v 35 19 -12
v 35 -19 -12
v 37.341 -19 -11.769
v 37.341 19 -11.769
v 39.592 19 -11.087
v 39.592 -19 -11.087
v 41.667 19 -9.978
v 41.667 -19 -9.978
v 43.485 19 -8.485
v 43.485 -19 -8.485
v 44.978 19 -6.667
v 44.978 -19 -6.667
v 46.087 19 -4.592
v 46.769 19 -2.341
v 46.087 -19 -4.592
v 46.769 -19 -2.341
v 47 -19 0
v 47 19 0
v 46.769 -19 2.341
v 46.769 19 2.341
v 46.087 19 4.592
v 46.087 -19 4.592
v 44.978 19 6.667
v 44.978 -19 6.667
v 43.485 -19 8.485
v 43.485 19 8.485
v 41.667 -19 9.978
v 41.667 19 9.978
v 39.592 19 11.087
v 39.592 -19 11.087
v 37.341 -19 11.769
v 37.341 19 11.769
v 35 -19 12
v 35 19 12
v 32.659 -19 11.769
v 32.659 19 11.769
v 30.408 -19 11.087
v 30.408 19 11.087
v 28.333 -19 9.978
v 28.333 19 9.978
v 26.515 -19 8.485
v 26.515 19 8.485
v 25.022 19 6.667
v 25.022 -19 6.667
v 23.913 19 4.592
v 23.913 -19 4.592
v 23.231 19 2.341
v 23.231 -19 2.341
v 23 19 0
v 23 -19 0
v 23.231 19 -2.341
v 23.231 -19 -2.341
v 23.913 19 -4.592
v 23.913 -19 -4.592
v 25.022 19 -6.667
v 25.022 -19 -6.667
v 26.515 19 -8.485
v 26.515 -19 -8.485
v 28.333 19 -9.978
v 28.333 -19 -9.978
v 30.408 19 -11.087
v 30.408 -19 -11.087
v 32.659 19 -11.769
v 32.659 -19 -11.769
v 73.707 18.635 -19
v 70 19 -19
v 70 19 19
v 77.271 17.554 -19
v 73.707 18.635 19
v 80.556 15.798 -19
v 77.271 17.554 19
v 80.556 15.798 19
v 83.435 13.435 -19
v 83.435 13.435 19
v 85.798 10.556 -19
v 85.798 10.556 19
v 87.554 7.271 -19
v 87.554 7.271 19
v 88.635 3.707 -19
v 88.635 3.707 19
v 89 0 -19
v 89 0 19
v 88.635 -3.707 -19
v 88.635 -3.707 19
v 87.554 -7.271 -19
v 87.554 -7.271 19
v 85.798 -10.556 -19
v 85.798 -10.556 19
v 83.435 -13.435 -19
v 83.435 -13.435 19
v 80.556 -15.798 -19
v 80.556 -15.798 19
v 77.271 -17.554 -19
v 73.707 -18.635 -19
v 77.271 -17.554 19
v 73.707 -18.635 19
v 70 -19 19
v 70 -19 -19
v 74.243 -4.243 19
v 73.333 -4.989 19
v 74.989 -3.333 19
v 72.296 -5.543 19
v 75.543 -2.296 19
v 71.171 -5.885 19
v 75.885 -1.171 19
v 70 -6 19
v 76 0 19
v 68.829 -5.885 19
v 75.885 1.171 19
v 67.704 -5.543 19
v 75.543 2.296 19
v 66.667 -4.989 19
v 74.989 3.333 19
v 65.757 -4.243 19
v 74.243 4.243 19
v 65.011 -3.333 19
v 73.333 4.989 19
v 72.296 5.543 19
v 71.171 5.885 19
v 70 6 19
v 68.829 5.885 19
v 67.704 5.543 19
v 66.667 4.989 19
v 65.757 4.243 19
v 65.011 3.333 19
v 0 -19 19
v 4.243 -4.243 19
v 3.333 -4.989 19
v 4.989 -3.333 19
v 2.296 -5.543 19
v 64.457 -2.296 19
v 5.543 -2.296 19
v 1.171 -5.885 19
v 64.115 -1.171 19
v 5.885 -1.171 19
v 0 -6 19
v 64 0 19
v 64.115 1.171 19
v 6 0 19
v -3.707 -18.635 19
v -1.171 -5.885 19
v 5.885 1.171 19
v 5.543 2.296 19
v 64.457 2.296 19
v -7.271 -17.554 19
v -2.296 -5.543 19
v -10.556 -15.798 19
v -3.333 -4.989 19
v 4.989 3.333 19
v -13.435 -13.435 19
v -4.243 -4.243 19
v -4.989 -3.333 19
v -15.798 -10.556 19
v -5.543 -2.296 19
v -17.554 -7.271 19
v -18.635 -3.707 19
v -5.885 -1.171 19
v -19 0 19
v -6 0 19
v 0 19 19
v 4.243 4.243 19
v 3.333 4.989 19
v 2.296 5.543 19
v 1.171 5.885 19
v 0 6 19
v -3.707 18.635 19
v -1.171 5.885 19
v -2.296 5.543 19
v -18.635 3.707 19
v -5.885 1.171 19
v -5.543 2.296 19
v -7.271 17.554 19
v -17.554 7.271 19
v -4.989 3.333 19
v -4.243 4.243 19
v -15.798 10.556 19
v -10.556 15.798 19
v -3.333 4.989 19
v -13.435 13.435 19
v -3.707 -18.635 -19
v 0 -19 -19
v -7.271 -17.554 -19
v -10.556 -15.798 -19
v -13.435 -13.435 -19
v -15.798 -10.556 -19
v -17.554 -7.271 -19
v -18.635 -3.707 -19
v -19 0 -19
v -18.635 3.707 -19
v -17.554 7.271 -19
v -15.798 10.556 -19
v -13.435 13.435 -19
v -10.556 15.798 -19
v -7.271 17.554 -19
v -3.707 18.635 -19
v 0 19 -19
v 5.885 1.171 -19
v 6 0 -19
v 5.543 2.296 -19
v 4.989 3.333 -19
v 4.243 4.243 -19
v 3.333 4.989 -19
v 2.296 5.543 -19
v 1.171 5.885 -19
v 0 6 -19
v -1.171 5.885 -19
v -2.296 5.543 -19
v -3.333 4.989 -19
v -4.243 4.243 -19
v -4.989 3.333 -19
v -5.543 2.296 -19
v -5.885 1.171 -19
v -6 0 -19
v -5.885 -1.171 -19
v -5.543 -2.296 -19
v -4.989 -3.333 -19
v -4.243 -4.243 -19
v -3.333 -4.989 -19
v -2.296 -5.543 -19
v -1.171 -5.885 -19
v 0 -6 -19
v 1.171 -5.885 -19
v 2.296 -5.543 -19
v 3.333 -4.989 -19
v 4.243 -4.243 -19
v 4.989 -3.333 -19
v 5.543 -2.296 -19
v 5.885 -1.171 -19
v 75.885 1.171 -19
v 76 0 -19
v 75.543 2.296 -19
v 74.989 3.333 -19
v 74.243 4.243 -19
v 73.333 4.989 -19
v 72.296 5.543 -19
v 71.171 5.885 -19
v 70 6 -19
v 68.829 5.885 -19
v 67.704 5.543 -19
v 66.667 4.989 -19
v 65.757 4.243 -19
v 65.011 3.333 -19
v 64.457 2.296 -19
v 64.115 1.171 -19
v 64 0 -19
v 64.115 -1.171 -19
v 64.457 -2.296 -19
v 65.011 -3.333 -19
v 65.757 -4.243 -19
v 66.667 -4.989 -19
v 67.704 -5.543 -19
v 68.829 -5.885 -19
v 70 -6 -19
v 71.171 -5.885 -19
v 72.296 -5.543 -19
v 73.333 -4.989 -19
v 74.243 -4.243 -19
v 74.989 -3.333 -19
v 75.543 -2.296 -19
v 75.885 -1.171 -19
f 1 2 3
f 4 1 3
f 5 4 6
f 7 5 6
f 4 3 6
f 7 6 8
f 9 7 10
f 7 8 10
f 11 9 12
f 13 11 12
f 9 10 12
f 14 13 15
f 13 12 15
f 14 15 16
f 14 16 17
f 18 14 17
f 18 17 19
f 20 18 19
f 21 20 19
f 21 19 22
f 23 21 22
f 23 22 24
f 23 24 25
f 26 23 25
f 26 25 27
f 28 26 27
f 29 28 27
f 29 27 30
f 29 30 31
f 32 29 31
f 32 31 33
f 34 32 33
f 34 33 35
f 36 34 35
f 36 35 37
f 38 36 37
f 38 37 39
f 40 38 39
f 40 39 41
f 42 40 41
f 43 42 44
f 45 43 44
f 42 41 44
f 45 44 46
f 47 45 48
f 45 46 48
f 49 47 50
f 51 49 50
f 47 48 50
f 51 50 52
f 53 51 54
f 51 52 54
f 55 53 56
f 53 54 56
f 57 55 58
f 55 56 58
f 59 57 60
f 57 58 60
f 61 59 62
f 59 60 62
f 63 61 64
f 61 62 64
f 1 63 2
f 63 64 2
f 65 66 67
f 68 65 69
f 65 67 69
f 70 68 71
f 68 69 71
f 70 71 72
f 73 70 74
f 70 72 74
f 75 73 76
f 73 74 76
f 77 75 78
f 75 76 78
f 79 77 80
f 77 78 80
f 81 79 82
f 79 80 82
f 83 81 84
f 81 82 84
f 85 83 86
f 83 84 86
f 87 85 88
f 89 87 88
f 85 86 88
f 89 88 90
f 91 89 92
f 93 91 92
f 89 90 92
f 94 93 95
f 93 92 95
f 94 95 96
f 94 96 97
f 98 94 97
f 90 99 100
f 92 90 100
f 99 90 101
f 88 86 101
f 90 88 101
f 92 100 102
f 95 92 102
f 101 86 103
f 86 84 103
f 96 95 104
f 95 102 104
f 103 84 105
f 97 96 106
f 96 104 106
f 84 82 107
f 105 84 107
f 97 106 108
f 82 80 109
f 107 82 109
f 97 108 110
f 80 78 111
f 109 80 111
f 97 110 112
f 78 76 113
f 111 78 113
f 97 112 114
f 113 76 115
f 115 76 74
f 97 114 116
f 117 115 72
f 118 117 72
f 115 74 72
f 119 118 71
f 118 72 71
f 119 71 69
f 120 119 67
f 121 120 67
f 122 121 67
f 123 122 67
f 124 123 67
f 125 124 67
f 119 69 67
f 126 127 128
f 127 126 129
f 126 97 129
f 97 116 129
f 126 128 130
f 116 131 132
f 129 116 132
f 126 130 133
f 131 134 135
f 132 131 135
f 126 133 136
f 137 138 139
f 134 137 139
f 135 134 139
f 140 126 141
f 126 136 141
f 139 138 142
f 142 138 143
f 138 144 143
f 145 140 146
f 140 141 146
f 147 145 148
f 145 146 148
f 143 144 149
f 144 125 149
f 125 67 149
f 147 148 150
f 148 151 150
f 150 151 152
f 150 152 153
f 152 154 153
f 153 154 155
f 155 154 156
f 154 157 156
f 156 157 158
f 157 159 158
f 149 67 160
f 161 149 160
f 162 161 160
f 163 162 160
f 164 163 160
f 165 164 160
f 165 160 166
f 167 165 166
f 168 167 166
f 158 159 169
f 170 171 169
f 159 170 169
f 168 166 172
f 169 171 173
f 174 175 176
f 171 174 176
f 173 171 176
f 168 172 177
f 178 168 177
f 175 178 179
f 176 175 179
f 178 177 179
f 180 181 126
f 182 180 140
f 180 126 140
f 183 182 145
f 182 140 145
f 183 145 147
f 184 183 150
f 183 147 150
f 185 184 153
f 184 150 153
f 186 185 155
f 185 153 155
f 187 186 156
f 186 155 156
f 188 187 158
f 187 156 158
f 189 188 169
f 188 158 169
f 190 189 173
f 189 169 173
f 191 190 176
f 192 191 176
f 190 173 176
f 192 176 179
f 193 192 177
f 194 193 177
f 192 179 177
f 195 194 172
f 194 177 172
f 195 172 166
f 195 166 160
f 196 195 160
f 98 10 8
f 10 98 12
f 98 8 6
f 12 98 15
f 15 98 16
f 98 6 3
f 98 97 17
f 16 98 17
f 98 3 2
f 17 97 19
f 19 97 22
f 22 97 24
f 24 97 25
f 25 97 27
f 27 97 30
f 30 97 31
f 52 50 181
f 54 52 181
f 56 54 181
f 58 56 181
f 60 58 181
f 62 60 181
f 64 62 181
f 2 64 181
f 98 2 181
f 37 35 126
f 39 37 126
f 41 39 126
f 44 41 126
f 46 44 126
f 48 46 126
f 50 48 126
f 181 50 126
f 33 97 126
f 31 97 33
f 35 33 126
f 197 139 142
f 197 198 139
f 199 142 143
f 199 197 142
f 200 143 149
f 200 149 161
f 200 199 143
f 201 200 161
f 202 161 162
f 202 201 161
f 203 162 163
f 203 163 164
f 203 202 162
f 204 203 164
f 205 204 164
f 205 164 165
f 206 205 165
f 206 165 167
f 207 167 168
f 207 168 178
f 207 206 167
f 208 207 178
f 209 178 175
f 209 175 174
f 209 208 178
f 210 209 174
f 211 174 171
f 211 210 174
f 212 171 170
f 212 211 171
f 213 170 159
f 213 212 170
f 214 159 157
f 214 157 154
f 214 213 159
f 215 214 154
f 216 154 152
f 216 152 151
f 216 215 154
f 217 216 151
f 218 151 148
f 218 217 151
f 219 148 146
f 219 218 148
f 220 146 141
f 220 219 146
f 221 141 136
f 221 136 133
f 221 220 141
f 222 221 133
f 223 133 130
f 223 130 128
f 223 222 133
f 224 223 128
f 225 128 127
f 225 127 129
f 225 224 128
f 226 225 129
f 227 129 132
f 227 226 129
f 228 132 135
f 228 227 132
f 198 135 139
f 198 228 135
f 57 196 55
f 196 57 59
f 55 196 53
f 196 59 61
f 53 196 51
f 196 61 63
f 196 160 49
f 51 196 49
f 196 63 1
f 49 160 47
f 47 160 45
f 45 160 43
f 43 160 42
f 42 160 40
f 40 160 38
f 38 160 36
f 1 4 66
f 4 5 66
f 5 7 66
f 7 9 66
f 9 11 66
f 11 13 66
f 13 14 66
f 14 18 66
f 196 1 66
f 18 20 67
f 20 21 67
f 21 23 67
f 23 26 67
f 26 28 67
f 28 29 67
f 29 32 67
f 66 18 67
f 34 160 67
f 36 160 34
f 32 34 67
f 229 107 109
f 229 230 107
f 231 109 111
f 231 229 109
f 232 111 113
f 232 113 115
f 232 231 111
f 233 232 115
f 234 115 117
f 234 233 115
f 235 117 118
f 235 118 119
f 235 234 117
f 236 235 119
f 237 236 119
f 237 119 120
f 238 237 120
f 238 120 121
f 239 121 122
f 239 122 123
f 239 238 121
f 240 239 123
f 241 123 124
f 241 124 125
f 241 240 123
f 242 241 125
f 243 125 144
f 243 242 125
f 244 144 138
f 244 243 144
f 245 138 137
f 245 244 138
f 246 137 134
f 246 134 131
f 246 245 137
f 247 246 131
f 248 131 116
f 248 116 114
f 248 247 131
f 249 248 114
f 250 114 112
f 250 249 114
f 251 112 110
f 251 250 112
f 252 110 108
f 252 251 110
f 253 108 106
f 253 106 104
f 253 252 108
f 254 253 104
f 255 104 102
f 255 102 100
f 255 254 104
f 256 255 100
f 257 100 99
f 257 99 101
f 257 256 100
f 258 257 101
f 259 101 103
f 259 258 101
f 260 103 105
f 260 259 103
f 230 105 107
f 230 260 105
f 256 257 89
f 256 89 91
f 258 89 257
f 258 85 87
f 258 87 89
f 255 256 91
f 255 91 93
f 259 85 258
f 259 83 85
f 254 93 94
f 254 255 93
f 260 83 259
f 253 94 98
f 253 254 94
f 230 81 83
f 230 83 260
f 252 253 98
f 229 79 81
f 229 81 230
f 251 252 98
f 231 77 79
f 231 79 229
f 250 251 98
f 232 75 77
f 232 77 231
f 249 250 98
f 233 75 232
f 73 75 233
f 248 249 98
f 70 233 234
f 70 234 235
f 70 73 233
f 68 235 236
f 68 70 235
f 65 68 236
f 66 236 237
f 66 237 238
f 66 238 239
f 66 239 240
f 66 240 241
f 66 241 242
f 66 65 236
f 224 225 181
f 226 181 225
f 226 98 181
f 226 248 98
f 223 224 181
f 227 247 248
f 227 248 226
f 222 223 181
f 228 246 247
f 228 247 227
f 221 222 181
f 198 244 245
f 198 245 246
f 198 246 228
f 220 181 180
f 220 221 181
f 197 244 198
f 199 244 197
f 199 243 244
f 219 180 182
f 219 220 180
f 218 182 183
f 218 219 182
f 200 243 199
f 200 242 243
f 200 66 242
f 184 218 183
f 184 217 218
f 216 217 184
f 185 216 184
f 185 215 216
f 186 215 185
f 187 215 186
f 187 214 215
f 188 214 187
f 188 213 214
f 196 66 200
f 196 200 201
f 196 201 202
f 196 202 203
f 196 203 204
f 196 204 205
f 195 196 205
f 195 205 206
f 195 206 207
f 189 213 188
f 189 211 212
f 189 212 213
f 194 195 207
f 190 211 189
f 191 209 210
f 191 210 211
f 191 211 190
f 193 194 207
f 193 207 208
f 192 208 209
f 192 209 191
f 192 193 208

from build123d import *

# Parameters (mm, degrees)
SKETCH1_R           = 6
BOSS_EXTRUDE1_DEPTH = 19
SKETCH2_R           = 12
CUT_EXTRUDE1_DEPTH  = 99.620484688


with BuildPart() as part:
    # Sketch1 → Boss-Extrude1 (new, symmetric)
    with BuildSketch(Plane.XY):
        with BuildLine():
            Line((0, 19), (70, 19))
            ThreePointArc((70, 19), (89, 0), (70, -19))
            Line((70, -19), (0, -19))
            ThreePointArc((0, -19), (-19, 0), (0, 19))
        make_face()
        Circle(SKETCH1_R, mode=Mode.SUBTRACT)
        with Locations((70, 0)):
            Circle(SKETCH1_R, mode=Mode.SUBTRACT)
    extrude(amount=BOSS_EXTRUDE1_DEPTH, both=True)

    # Sketch2 → Cut-Extrude1 (cut, through all)
    with BuildSketch(Plane.XZ.offset(19)):
        with Locations(Location((35, 0, 0), (0, 0, 270))):
            Circle(SKETCH2_R)
    extrude(amount=-CUT_EXTRUDE1_DEPTH, mode=Mode.SUBTRACT)


solid = part.part
